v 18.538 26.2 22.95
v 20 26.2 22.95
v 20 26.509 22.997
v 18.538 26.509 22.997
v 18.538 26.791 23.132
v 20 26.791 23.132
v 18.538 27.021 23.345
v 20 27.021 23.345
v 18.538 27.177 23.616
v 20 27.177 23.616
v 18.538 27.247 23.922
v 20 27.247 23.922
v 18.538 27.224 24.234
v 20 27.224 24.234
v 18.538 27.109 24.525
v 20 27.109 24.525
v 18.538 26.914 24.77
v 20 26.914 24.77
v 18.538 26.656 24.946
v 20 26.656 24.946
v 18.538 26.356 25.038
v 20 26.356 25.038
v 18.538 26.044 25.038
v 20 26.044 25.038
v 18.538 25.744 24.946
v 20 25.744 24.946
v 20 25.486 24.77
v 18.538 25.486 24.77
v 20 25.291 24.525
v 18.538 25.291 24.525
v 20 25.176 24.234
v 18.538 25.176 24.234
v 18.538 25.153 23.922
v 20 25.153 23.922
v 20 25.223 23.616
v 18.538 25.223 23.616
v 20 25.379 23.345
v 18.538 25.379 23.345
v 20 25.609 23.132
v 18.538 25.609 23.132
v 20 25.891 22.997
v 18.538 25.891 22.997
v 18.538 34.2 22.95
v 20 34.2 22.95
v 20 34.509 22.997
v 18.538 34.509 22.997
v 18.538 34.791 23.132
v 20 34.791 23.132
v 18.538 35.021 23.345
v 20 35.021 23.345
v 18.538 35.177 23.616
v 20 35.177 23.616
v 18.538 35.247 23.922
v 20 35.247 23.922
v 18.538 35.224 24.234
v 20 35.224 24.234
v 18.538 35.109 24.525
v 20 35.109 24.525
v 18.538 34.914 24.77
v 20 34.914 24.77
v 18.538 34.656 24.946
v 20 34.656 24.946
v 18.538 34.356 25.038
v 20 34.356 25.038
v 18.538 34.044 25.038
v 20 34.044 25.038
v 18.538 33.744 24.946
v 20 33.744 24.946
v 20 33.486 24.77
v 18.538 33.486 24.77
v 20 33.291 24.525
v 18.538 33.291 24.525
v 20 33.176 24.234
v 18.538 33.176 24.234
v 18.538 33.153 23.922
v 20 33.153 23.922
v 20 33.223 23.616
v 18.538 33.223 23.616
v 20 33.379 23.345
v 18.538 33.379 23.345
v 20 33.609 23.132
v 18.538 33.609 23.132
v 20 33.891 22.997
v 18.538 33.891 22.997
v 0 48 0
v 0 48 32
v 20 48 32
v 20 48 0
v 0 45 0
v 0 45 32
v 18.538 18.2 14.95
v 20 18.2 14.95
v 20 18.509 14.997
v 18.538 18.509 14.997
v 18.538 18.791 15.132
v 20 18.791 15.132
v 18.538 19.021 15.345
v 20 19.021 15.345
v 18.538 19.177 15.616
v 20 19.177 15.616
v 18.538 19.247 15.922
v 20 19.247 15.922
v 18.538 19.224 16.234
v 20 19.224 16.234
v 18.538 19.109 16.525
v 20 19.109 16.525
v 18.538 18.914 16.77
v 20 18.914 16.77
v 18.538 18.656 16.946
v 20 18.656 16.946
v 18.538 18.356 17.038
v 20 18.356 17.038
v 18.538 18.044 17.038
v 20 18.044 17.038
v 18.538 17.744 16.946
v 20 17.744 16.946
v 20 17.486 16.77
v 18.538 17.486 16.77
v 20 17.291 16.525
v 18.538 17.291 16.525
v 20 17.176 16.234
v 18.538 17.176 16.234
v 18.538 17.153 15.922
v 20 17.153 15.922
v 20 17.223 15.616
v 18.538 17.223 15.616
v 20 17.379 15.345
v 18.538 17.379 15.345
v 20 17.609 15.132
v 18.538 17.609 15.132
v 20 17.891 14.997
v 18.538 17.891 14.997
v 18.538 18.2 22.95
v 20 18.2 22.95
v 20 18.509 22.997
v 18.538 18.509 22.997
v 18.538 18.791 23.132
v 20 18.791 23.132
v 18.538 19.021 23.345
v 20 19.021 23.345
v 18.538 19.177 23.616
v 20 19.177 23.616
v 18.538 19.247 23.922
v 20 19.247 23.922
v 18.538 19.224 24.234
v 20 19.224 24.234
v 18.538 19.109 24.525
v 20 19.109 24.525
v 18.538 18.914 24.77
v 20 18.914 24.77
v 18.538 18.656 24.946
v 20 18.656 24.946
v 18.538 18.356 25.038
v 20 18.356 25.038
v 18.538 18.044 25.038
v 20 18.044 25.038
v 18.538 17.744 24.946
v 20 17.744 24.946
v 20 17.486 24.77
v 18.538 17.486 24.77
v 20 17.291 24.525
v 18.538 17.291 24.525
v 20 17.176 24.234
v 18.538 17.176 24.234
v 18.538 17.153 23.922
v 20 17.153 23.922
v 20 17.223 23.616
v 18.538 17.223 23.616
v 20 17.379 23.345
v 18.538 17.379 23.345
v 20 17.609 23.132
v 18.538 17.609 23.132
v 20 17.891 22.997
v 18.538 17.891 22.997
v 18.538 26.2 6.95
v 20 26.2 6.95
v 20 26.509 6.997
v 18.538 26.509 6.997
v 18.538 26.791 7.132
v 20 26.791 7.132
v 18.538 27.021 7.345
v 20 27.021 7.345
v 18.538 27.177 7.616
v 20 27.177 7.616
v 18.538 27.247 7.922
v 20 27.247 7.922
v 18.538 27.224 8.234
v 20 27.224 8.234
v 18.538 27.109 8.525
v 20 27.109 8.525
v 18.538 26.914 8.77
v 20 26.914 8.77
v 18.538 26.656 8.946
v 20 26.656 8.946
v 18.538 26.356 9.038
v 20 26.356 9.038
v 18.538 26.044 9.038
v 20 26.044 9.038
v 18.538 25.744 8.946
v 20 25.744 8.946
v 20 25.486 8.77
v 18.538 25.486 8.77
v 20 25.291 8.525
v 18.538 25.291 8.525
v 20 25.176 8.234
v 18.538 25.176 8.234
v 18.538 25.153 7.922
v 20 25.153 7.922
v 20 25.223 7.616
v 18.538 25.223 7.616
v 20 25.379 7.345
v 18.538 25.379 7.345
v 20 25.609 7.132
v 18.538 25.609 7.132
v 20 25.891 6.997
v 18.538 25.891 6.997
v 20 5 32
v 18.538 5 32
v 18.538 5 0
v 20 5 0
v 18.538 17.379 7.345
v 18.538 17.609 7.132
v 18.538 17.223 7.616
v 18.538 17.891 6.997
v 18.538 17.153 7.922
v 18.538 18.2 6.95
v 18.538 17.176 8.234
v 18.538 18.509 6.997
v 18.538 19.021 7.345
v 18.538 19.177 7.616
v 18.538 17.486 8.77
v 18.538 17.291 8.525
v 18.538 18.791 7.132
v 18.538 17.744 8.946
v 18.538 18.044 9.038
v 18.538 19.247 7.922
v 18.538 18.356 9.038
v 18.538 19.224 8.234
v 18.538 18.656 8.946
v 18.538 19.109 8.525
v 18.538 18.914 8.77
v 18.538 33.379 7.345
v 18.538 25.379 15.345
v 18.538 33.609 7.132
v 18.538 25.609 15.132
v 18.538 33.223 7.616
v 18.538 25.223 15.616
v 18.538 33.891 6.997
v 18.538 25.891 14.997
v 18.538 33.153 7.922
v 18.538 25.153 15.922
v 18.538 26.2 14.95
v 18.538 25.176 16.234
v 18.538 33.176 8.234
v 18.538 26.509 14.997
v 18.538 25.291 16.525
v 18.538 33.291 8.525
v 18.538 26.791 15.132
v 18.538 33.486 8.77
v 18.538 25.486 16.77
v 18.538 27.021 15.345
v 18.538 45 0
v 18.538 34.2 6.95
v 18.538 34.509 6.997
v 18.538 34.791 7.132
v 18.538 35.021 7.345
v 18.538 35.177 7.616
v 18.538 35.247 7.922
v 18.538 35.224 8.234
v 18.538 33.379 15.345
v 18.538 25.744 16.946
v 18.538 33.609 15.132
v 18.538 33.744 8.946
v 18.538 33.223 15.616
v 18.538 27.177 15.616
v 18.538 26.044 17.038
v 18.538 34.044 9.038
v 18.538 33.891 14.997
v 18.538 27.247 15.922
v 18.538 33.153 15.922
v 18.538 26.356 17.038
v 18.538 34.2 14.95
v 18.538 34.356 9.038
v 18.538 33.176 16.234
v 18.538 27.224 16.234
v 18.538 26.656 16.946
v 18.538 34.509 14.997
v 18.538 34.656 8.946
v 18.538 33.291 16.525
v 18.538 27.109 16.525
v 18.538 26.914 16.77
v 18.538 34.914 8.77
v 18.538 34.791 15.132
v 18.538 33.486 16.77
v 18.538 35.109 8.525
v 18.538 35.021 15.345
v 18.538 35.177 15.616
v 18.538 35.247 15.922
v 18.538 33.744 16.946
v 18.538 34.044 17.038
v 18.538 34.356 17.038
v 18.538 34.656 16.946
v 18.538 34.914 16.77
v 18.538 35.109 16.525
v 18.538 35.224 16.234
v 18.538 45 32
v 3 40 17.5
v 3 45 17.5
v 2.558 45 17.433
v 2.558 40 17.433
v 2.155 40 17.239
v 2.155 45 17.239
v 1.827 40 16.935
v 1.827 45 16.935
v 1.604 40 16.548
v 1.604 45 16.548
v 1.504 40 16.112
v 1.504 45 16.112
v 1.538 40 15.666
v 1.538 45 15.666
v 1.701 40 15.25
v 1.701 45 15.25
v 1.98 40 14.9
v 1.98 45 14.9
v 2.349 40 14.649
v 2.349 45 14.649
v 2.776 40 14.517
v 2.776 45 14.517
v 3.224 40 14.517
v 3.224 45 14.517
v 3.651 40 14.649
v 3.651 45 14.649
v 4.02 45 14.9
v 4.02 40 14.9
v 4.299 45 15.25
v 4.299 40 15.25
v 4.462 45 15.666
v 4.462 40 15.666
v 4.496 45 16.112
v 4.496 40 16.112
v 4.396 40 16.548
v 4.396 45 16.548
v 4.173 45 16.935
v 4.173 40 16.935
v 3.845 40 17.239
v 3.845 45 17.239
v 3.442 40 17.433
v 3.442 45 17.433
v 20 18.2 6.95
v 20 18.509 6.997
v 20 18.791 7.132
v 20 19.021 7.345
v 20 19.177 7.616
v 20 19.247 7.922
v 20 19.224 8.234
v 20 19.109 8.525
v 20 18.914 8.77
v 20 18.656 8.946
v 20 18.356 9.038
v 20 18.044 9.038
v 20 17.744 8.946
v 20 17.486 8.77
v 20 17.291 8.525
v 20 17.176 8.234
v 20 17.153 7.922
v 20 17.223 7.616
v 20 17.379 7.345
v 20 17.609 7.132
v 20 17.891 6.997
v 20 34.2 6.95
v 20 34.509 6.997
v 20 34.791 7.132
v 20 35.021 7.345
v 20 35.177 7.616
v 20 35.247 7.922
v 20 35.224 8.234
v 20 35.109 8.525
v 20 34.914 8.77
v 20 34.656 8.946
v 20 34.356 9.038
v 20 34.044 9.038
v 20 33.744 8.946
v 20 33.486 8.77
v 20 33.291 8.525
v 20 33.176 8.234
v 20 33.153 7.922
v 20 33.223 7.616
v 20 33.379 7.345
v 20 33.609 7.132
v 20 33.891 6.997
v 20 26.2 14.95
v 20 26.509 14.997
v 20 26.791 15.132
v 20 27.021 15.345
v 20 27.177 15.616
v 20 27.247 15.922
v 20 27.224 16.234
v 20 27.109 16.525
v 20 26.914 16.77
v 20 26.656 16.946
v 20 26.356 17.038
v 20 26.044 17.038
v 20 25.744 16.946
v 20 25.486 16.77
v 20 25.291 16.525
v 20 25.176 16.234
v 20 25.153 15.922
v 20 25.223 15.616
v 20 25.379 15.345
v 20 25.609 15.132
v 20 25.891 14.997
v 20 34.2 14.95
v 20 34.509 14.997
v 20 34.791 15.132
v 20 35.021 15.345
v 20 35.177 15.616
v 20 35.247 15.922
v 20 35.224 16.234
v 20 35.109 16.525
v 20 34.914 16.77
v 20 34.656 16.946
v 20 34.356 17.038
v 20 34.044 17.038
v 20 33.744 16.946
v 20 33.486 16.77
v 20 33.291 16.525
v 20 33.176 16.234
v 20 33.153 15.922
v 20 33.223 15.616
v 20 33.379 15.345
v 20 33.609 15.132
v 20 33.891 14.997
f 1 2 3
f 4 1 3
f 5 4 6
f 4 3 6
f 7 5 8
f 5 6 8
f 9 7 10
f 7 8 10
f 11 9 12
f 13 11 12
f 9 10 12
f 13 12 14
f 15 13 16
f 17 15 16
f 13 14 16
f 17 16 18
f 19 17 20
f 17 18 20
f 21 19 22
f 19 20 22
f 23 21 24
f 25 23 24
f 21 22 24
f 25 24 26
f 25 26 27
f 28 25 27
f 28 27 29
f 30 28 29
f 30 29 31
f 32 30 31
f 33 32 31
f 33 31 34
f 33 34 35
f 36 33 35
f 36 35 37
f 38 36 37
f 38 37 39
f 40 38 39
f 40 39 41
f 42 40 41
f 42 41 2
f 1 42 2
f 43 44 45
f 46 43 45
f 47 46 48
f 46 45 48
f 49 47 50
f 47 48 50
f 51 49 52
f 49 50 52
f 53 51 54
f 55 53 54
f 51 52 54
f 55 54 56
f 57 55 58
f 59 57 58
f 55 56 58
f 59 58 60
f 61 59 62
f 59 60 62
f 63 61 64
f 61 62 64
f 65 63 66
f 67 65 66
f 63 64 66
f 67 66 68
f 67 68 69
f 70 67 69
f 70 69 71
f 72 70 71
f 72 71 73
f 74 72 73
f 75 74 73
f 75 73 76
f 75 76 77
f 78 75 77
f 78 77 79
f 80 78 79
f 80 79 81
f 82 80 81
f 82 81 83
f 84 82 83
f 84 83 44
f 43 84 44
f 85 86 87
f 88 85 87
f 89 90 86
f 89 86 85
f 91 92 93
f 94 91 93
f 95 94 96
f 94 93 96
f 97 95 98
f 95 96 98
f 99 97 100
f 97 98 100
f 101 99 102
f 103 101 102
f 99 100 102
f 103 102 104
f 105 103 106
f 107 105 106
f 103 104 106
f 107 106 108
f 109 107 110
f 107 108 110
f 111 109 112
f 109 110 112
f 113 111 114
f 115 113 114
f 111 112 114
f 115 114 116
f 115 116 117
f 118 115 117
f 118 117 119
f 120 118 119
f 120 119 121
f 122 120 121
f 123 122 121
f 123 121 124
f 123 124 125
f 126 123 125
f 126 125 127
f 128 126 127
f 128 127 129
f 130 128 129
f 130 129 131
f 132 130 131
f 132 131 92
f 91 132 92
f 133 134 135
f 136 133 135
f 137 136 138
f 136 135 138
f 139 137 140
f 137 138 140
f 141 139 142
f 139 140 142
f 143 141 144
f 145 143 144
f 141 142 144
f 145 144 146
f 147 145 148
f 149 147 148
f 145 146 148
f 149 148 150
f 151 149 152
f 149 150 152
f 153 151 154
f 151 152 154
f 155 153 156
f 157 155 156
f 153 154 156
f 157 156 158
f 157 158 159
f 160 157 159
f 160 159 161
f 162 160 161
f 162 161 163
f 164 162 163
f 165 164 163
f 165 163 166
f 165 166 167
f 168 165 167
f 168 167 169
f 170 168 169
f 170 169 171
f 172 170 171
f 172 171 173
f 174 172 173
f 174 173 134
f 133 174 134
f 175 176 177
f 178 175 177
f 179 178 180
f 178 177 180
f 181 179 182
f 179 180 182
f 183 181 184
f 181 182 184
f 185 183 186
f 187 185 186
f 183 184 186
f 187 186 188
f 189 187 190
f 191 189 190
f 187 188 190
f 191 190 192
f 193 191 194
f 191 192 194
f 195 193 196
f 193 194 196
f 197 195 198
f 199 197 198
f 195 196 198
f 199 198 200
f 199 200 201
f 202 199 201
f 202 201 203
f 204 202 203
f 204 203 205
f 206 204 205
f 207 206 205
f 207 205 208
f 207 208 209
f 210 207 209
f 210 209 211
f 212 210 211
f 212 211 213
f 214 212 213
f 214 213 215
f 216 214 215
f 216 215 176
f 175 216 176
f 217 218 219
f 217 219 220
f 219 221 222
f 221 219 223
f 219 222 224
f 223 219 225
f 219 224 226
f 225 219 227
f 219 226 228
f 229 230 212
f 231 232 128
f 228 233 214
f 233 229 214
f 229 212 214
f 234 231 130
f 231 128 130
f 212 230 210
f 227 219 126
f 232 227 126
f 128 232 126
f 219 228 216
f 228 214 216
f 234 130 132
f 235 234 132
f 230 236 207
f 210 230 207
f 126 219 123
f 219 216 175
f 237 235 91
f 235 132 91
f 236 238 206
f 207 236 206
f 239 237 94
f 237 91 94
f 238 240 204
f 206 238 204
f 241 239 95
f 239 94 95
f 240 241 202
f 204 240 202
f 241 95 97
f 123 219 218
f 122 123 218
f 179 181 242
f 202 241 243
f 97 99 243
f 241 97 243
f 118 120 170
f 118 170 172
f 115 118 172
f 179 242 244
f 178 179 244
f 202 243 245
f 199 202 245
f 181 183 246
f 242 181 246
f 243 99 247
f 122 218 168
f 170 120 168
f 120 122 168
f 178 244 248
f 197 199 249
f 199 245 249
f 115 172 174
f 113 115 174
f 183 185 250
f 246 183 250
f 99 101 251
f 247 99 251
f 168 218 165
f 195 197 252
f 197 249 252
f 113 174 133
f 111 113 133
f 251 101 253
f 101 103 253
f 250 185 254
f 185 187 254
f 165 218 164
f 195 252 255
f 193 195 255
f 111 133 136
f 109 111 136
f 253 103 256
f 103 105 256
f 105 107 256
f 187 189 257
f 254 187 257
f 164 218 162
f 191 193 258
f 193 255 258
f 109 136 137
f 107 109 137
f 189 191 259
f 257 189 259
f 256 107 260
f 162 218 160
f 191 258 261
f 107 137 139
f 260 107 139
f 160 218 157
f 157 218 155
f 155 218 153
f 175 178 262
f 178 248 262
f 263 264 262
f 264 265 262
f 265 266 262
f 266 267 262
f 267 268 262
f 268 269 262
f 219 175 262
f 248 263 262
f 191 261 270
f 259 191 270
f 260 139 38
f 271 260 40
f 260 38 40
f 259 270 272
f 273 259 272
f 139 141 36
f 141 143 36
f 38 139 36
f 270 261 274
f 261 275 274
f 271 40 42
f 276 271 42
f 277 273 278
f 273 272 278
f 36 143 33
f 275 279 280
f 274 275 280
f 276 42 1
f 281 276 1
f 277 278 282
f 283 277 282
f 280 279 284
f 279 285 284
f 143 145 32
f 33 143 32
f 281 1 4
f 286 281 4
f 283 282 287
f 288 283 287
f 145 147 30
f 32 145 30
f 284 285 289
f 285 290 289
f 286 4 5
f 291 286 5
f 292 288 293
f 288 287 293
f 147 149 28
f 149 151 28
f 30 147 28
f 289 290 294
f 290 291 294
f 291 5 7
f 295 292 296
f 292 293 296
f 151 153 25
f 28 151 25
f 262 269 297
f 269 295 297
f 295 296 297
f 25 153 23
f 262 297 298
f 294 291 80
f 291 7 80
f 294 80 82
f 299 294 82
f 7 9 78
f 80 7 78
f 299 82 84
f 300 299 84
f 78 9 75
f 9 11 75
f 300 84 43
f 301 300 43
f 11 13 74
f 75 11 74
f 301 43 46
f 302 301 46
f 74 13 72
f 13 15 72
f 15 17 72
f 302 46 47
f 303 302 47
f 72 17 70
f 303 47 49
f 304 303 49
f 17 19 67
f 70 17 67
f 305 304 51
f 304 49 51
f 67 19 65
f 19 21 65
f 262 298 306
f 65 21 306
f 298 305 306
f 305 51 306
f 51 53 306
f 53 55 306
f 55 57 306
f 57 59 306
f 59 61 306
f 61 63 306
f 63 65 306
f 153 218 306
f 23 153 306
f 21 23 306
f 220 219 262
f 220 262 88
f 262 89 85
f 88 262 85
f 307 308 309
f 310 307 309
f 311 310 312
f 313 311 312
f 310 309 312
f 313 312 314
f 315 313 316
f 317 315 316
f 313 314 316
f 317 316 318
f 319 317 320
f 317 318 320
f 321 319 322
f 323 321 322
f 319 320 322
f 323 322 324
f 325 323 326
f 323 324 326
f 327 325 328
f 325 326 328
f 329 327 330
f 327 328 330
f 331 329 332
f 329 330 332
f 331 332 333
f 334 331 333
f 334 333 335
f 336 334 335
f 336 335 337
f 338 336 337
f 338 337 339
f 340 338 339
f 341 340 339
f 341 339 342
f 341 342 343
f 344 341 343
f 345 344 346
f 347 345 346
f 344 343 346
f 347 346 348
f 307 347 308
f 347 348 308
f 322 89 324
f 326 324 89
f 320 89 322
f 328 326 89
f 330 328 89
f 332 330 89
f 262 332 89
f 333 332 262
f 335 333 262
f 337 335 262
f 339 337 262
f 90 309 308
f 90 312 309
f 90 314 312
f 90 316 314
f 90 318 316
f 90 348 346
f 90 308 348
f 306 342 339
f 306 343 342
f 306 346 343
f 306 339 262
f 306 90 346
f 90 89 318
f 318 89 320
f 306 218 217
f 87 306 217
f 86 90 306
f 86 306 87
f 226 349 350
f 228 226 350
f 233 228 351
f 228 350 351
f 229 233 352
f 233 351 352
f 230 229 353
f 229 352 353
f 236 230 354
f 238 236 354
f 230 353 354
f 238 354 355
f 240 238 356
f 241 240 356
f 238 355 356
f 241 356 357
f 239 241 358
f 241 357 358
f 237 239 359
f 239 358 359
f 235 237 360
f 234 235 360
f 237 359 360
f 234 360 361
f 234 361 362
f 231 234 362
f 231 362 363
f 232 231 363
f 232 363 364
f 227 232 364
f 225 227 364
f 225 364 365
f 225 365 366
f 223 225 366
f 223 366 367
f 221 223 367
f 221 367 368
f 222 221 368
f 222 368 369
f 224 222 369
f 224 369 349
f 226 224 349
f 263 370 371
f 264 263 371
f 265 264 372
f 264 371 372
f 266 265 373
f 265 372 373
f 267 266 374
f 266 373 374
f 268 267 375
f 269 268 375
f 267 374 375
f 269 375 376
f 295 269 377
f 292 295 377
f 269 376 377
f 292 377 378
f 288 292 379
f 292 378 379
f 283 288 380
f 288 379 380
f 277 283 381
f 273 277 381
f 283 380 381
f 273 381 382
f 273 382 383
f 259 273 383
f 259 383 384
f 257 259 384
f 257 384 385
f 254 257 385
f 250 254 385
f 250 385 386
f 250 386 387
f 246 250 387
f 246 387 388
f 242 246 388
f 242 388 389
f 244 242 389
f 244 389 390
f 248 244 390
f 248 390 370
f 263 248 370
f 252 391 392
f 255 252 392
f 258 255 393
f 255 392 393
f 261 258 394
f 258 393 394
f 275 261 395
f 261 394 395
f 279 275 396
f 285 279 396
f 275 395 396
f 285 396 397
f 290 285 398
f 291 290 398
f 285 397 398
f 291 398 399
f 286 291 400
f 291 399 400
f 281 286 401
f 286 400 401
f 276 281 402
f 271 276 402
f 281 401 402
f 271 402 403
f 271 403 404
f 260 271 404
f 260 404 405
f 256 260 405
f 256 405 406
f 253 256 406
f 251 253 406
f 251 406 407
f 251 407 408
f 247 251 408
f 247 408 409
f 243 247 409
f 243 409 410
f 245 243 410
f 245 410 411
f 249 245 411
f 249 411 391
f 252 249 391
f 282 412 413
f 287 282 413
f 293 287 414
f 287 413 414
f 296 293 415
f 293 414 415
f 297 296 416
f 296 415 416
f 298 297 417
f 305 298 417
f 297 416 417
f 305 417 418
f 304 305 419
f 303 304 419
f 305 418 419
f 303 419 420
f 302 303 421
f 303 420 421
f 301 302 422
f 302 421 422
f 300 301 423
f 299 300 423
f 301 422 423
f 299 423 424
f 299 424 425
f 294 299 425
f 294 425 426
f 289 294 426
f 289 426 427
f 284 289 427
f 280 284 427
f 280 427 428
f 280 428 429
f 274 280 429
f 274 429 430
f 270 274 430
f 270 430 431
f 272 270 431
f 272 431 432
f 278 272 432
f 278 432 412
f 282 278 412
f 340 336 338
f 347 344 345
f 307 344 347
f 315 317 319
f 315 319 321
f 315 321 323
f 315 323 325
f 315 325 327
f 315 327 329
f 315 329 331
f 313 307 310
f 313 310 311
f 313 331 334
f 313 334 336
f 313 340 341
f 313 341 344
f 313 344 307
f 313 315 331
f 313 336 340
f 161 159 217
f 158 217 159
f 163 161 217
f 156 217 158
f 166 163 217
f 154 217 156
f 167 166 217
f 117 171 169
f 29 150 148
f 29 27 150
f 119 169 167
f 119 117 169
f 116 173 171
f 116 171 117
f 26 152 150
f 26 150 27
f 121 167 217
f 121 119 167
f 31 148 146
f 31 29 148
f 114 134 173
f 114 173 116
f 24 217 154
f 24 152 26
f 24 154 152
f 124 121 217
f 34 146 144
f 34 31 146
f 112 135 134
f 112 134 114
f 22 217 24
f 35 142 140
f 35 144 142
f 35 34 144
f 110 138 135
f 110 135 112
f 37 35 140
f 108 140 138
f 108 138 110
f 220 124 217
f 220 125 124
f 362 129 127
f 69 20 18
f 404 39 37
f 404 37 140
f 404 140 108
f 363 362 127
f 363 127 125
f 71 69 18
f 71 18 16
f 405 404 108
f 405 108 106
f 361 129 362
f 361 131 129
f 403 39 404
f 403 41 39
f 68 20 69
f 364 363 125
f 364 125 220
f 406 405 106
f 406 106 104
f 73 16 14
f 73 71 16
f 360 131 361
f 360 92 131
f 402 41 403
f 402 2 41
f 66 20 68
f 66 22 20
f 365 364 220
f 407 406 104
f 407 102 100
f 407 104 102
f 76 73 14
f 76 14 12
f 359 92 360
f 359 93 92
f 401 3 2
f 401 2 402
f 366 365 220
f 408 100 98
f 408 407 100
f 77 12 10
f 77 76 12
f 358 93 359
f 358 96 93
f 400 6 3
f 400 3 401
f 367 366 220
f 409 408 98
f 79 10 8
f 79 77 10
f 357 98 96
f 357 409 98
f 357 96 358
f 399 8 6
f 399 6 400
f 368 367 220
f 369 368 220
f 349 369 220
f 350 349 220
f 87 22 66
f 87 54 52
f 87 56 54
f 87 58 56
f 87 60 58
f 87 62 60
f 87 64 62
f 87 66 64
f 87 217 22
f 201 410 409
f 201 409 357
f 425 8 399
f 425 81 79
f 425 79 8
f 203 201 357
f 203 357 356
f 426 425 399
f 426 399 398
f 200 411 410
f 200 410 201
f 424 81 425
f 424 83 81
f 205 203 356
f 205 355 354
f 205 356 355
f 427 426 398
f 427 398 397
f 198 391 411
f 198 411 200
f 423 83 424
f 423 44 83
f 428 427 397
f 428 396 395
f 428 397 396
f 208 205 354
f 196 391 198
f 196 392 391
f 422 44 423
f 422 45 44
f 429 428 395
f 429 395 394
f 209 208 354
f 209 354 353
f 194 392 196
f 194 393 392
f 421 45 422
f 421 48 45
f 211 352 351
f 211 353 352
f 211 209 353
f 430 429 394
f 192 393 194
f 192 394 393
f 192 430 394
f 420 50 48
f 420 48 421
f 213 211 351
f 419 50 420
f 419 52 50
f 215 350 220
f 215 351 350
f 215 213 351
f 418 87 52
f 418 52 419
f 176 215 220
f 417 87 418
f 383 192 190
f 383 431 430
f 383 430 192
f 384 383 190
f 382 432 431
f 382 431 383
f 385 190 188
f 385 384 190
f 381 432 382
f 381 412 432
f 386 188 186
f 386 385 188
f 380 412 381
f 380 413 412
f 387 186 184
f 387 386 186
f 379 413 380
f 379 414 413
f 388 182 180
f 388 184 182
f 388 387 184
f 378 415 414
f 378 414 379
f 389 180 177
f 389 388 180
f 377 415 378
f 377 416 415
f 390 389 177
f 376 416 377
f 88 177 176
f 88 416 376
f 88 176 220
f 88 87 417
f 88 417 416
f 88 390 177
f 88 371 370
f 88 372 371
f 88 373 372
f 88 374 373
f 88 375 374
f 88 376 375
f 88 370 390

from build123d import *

# Parameters (mm, degrees)
SKETCH_1_W          = 15
SKETCH_1_H          = 40
EXTRUDE_1_DEPTH     = 32
SKETCH_3_W          = 15
SKETCH_3_H          = 32
EXTRUDE_2_DEPTH     = 10
SKETCH_5_W          = 13
SKETCH_5_H          = 45
CUT_EXTRUDE_1_DEPTH = 62.229078059
SKETCH_7_W          = 32
SKETCH_7_H          = 50
EXTRUDE_3_DEPTH     = 5
SKETCH_8_W          = 3
SKETCH_8_H          = 40
CUT_EXTRUDE_2_DEPTH = 63.641839053
SKETCH_9_W          = 3
SKETCH_9_H          = 5
CUT_EXTRUDE_3_DEPTH = 63.641839053
SKETCH_10_R         = 1.5
EXTRUDE_4_DEPTH     = 5
SKETCH_11_R         = 1.05
CUT_EXTRUDE_4_DEPTH = 63.641839053
SKETCH_12_W         = 4
SKETCH_12_H         = 5
CUT_EXTRUDE_5_DEPTH = 63.641839053
SKETCH_13_W         = 2.538060983
SKETCH_13_H         = 40
CUT_EXTRUDE_6_DEPTH = 63.641839053
SKETCH_14_W         = 20
SKETCH_14_H         = 2
CUT_EXTRUDE_7_DEPTH = 63.641839053


with BuildPart() as part:
    # 草图1 → 凸台-拉伸1 (new body)
    with BuildSketch(Plane.XY):
        with Locations((7.5, 20)):
            Rectangle(SKETCH_1_W, SKETCH_1_H)
    extrude(amount=EXTRUDE_1_DEPTH)

    # 草图3 → 凸台-拉伸2 (add)
    with BuildSketch(Plane(origin=(0, 40, 0), x_dir=(1, 0, 0), z_dir=(0, 1, 0))):
        with Locations((7.5, -16)):
            Rectangle(SKETCH_3_W, SKETCH_3_H)
    extrude(amount=EXTRUDE_2_DEPTH)

    # 草图5 → 切除-拉伸1 (cut, through all)
    with BuildSketch(Plane.XY.offset(32)):
        with Locations((6.5, 22.5)):
            Rectangle(SKETCH_5_W, SKETCH_5_H)
    extrude(amount=-CUT_EXTRUDE_1_DEPTH, mode=Mode.SUBTRACT)

    # 草图7 → 凸台-拉伸3 (add)
    with BuildSketch(Plane(origin=(15, 0, 0), x_dir=(0, 0, -1), z_dir=(1, 0, 0))):
        with Locations((-16, 25)):
            Rectangle(SKETCH_7_W, SKETCH_7_H)
    extrude(amount=EXTRUDE_3_DEPTH)

    # 草图8 → 切除-拉伸2 (cut, through all)
    with BuildSketch(Plane.XY.offset(32)):
        with Locations((14.5, 25)):
            Rectangle(SKETCH_8_W, SKETCH_8_H)
    extrude(amount=-CUT_EXTRUDE_2_DEPTH, mode=Mode.SUBTRACT)

    # 草图9 → 切除-拉伸3 (cut, through all)
    with BuildSketch(Plane.XY.offset(32)):
        with Locations((14.5, 2.5)):
            Rectangle(SKETCH_9_W, SKETCH_9_H)
    extrude(amount=-CUT_EXTRUDE_3_DEPTH, mode=Mode.SUBTRACT)

    # 草图10 → 凸台-拉伸4 (add)
    with BuildSketch(Plane.XZ.offset(-45)):
        with Locations(Location((3, 16, 0), (0, 0, 90))):
            Circle(SKETCH_10_R)
    extrude(amount=EXTRUDE_4_DEPTH)

    # 草图11 → 切除-拉伸4 (cut, through all)
    with BuildSketch(Plane(origin=(20, 0, 0), x_dir=(0, 0, -1), z_dir=(1, 0, 0))):
        with Locations((-24, 34.2)):
            Circle(SKETCH_11_R)
        with Locations((-24, 26.2)):
            Circle(SKETCH_11_R)
        with Locations((-24, 18.2)):
            Circle(SKETCH_11_R)
        with Locations((-16, 34.2)):
            Circle(SKETCH_11_R)
        with Locations((-16, 26.2)):
            Circle(SKETCH_11_R)
        with Locations((-16, 18.2)):
            Circle(SKETCH_11_R)
        with Locations((-8, 18.2)):
            Circle(SKETCH_11_R)
        with Locations((-8, 26.2)):
            Circle(SKETCH_11_R)
        with Locations((-8, 34.2)):
            Circle(SKETCH_11_R)
    extrude(amount=-CUT_EXTRUDE_4_DEPTH, mode=Mode.SUBTRACT)

    # 草图12 → 切除-拉伸5 (cut, through all)
    with BuildSketch(Plane.XY.offset(32)):
        with Locations((18, 2.5)):
            Rectangle(SKETCH_12_W, SKETCH_12_H)
    extrude(amount=-CUT_EXTRUDE_5_DEPTH, mode=Mode.SUBTRACT)

    # 草图13 → 切除-拉伸6 (cut, through all)
    with BuildSketch(Plane.XY.offset(32)):
        with Locations((17.269030492, 25)):
            Rectangle(SKETCH_13_W, SKETCH_13_H)
    extrude(amount=-CUT_EXTRUDE_6_DEPTH, mode=Mode.SUBTRACT)

    # 草图14 → 切除-拉伸7 (cut, through all)
    with BuildSketch(Plane.XY.offset(32)):
        with Locations((10, 49)):
            Rectangle(SKETCH_14_W, SKETCH_14_H)
    extrude(amount=-CUT_EXTRUDE_7_DEPTH, mode=Mode.SUBTRACT)


solid = part.part
